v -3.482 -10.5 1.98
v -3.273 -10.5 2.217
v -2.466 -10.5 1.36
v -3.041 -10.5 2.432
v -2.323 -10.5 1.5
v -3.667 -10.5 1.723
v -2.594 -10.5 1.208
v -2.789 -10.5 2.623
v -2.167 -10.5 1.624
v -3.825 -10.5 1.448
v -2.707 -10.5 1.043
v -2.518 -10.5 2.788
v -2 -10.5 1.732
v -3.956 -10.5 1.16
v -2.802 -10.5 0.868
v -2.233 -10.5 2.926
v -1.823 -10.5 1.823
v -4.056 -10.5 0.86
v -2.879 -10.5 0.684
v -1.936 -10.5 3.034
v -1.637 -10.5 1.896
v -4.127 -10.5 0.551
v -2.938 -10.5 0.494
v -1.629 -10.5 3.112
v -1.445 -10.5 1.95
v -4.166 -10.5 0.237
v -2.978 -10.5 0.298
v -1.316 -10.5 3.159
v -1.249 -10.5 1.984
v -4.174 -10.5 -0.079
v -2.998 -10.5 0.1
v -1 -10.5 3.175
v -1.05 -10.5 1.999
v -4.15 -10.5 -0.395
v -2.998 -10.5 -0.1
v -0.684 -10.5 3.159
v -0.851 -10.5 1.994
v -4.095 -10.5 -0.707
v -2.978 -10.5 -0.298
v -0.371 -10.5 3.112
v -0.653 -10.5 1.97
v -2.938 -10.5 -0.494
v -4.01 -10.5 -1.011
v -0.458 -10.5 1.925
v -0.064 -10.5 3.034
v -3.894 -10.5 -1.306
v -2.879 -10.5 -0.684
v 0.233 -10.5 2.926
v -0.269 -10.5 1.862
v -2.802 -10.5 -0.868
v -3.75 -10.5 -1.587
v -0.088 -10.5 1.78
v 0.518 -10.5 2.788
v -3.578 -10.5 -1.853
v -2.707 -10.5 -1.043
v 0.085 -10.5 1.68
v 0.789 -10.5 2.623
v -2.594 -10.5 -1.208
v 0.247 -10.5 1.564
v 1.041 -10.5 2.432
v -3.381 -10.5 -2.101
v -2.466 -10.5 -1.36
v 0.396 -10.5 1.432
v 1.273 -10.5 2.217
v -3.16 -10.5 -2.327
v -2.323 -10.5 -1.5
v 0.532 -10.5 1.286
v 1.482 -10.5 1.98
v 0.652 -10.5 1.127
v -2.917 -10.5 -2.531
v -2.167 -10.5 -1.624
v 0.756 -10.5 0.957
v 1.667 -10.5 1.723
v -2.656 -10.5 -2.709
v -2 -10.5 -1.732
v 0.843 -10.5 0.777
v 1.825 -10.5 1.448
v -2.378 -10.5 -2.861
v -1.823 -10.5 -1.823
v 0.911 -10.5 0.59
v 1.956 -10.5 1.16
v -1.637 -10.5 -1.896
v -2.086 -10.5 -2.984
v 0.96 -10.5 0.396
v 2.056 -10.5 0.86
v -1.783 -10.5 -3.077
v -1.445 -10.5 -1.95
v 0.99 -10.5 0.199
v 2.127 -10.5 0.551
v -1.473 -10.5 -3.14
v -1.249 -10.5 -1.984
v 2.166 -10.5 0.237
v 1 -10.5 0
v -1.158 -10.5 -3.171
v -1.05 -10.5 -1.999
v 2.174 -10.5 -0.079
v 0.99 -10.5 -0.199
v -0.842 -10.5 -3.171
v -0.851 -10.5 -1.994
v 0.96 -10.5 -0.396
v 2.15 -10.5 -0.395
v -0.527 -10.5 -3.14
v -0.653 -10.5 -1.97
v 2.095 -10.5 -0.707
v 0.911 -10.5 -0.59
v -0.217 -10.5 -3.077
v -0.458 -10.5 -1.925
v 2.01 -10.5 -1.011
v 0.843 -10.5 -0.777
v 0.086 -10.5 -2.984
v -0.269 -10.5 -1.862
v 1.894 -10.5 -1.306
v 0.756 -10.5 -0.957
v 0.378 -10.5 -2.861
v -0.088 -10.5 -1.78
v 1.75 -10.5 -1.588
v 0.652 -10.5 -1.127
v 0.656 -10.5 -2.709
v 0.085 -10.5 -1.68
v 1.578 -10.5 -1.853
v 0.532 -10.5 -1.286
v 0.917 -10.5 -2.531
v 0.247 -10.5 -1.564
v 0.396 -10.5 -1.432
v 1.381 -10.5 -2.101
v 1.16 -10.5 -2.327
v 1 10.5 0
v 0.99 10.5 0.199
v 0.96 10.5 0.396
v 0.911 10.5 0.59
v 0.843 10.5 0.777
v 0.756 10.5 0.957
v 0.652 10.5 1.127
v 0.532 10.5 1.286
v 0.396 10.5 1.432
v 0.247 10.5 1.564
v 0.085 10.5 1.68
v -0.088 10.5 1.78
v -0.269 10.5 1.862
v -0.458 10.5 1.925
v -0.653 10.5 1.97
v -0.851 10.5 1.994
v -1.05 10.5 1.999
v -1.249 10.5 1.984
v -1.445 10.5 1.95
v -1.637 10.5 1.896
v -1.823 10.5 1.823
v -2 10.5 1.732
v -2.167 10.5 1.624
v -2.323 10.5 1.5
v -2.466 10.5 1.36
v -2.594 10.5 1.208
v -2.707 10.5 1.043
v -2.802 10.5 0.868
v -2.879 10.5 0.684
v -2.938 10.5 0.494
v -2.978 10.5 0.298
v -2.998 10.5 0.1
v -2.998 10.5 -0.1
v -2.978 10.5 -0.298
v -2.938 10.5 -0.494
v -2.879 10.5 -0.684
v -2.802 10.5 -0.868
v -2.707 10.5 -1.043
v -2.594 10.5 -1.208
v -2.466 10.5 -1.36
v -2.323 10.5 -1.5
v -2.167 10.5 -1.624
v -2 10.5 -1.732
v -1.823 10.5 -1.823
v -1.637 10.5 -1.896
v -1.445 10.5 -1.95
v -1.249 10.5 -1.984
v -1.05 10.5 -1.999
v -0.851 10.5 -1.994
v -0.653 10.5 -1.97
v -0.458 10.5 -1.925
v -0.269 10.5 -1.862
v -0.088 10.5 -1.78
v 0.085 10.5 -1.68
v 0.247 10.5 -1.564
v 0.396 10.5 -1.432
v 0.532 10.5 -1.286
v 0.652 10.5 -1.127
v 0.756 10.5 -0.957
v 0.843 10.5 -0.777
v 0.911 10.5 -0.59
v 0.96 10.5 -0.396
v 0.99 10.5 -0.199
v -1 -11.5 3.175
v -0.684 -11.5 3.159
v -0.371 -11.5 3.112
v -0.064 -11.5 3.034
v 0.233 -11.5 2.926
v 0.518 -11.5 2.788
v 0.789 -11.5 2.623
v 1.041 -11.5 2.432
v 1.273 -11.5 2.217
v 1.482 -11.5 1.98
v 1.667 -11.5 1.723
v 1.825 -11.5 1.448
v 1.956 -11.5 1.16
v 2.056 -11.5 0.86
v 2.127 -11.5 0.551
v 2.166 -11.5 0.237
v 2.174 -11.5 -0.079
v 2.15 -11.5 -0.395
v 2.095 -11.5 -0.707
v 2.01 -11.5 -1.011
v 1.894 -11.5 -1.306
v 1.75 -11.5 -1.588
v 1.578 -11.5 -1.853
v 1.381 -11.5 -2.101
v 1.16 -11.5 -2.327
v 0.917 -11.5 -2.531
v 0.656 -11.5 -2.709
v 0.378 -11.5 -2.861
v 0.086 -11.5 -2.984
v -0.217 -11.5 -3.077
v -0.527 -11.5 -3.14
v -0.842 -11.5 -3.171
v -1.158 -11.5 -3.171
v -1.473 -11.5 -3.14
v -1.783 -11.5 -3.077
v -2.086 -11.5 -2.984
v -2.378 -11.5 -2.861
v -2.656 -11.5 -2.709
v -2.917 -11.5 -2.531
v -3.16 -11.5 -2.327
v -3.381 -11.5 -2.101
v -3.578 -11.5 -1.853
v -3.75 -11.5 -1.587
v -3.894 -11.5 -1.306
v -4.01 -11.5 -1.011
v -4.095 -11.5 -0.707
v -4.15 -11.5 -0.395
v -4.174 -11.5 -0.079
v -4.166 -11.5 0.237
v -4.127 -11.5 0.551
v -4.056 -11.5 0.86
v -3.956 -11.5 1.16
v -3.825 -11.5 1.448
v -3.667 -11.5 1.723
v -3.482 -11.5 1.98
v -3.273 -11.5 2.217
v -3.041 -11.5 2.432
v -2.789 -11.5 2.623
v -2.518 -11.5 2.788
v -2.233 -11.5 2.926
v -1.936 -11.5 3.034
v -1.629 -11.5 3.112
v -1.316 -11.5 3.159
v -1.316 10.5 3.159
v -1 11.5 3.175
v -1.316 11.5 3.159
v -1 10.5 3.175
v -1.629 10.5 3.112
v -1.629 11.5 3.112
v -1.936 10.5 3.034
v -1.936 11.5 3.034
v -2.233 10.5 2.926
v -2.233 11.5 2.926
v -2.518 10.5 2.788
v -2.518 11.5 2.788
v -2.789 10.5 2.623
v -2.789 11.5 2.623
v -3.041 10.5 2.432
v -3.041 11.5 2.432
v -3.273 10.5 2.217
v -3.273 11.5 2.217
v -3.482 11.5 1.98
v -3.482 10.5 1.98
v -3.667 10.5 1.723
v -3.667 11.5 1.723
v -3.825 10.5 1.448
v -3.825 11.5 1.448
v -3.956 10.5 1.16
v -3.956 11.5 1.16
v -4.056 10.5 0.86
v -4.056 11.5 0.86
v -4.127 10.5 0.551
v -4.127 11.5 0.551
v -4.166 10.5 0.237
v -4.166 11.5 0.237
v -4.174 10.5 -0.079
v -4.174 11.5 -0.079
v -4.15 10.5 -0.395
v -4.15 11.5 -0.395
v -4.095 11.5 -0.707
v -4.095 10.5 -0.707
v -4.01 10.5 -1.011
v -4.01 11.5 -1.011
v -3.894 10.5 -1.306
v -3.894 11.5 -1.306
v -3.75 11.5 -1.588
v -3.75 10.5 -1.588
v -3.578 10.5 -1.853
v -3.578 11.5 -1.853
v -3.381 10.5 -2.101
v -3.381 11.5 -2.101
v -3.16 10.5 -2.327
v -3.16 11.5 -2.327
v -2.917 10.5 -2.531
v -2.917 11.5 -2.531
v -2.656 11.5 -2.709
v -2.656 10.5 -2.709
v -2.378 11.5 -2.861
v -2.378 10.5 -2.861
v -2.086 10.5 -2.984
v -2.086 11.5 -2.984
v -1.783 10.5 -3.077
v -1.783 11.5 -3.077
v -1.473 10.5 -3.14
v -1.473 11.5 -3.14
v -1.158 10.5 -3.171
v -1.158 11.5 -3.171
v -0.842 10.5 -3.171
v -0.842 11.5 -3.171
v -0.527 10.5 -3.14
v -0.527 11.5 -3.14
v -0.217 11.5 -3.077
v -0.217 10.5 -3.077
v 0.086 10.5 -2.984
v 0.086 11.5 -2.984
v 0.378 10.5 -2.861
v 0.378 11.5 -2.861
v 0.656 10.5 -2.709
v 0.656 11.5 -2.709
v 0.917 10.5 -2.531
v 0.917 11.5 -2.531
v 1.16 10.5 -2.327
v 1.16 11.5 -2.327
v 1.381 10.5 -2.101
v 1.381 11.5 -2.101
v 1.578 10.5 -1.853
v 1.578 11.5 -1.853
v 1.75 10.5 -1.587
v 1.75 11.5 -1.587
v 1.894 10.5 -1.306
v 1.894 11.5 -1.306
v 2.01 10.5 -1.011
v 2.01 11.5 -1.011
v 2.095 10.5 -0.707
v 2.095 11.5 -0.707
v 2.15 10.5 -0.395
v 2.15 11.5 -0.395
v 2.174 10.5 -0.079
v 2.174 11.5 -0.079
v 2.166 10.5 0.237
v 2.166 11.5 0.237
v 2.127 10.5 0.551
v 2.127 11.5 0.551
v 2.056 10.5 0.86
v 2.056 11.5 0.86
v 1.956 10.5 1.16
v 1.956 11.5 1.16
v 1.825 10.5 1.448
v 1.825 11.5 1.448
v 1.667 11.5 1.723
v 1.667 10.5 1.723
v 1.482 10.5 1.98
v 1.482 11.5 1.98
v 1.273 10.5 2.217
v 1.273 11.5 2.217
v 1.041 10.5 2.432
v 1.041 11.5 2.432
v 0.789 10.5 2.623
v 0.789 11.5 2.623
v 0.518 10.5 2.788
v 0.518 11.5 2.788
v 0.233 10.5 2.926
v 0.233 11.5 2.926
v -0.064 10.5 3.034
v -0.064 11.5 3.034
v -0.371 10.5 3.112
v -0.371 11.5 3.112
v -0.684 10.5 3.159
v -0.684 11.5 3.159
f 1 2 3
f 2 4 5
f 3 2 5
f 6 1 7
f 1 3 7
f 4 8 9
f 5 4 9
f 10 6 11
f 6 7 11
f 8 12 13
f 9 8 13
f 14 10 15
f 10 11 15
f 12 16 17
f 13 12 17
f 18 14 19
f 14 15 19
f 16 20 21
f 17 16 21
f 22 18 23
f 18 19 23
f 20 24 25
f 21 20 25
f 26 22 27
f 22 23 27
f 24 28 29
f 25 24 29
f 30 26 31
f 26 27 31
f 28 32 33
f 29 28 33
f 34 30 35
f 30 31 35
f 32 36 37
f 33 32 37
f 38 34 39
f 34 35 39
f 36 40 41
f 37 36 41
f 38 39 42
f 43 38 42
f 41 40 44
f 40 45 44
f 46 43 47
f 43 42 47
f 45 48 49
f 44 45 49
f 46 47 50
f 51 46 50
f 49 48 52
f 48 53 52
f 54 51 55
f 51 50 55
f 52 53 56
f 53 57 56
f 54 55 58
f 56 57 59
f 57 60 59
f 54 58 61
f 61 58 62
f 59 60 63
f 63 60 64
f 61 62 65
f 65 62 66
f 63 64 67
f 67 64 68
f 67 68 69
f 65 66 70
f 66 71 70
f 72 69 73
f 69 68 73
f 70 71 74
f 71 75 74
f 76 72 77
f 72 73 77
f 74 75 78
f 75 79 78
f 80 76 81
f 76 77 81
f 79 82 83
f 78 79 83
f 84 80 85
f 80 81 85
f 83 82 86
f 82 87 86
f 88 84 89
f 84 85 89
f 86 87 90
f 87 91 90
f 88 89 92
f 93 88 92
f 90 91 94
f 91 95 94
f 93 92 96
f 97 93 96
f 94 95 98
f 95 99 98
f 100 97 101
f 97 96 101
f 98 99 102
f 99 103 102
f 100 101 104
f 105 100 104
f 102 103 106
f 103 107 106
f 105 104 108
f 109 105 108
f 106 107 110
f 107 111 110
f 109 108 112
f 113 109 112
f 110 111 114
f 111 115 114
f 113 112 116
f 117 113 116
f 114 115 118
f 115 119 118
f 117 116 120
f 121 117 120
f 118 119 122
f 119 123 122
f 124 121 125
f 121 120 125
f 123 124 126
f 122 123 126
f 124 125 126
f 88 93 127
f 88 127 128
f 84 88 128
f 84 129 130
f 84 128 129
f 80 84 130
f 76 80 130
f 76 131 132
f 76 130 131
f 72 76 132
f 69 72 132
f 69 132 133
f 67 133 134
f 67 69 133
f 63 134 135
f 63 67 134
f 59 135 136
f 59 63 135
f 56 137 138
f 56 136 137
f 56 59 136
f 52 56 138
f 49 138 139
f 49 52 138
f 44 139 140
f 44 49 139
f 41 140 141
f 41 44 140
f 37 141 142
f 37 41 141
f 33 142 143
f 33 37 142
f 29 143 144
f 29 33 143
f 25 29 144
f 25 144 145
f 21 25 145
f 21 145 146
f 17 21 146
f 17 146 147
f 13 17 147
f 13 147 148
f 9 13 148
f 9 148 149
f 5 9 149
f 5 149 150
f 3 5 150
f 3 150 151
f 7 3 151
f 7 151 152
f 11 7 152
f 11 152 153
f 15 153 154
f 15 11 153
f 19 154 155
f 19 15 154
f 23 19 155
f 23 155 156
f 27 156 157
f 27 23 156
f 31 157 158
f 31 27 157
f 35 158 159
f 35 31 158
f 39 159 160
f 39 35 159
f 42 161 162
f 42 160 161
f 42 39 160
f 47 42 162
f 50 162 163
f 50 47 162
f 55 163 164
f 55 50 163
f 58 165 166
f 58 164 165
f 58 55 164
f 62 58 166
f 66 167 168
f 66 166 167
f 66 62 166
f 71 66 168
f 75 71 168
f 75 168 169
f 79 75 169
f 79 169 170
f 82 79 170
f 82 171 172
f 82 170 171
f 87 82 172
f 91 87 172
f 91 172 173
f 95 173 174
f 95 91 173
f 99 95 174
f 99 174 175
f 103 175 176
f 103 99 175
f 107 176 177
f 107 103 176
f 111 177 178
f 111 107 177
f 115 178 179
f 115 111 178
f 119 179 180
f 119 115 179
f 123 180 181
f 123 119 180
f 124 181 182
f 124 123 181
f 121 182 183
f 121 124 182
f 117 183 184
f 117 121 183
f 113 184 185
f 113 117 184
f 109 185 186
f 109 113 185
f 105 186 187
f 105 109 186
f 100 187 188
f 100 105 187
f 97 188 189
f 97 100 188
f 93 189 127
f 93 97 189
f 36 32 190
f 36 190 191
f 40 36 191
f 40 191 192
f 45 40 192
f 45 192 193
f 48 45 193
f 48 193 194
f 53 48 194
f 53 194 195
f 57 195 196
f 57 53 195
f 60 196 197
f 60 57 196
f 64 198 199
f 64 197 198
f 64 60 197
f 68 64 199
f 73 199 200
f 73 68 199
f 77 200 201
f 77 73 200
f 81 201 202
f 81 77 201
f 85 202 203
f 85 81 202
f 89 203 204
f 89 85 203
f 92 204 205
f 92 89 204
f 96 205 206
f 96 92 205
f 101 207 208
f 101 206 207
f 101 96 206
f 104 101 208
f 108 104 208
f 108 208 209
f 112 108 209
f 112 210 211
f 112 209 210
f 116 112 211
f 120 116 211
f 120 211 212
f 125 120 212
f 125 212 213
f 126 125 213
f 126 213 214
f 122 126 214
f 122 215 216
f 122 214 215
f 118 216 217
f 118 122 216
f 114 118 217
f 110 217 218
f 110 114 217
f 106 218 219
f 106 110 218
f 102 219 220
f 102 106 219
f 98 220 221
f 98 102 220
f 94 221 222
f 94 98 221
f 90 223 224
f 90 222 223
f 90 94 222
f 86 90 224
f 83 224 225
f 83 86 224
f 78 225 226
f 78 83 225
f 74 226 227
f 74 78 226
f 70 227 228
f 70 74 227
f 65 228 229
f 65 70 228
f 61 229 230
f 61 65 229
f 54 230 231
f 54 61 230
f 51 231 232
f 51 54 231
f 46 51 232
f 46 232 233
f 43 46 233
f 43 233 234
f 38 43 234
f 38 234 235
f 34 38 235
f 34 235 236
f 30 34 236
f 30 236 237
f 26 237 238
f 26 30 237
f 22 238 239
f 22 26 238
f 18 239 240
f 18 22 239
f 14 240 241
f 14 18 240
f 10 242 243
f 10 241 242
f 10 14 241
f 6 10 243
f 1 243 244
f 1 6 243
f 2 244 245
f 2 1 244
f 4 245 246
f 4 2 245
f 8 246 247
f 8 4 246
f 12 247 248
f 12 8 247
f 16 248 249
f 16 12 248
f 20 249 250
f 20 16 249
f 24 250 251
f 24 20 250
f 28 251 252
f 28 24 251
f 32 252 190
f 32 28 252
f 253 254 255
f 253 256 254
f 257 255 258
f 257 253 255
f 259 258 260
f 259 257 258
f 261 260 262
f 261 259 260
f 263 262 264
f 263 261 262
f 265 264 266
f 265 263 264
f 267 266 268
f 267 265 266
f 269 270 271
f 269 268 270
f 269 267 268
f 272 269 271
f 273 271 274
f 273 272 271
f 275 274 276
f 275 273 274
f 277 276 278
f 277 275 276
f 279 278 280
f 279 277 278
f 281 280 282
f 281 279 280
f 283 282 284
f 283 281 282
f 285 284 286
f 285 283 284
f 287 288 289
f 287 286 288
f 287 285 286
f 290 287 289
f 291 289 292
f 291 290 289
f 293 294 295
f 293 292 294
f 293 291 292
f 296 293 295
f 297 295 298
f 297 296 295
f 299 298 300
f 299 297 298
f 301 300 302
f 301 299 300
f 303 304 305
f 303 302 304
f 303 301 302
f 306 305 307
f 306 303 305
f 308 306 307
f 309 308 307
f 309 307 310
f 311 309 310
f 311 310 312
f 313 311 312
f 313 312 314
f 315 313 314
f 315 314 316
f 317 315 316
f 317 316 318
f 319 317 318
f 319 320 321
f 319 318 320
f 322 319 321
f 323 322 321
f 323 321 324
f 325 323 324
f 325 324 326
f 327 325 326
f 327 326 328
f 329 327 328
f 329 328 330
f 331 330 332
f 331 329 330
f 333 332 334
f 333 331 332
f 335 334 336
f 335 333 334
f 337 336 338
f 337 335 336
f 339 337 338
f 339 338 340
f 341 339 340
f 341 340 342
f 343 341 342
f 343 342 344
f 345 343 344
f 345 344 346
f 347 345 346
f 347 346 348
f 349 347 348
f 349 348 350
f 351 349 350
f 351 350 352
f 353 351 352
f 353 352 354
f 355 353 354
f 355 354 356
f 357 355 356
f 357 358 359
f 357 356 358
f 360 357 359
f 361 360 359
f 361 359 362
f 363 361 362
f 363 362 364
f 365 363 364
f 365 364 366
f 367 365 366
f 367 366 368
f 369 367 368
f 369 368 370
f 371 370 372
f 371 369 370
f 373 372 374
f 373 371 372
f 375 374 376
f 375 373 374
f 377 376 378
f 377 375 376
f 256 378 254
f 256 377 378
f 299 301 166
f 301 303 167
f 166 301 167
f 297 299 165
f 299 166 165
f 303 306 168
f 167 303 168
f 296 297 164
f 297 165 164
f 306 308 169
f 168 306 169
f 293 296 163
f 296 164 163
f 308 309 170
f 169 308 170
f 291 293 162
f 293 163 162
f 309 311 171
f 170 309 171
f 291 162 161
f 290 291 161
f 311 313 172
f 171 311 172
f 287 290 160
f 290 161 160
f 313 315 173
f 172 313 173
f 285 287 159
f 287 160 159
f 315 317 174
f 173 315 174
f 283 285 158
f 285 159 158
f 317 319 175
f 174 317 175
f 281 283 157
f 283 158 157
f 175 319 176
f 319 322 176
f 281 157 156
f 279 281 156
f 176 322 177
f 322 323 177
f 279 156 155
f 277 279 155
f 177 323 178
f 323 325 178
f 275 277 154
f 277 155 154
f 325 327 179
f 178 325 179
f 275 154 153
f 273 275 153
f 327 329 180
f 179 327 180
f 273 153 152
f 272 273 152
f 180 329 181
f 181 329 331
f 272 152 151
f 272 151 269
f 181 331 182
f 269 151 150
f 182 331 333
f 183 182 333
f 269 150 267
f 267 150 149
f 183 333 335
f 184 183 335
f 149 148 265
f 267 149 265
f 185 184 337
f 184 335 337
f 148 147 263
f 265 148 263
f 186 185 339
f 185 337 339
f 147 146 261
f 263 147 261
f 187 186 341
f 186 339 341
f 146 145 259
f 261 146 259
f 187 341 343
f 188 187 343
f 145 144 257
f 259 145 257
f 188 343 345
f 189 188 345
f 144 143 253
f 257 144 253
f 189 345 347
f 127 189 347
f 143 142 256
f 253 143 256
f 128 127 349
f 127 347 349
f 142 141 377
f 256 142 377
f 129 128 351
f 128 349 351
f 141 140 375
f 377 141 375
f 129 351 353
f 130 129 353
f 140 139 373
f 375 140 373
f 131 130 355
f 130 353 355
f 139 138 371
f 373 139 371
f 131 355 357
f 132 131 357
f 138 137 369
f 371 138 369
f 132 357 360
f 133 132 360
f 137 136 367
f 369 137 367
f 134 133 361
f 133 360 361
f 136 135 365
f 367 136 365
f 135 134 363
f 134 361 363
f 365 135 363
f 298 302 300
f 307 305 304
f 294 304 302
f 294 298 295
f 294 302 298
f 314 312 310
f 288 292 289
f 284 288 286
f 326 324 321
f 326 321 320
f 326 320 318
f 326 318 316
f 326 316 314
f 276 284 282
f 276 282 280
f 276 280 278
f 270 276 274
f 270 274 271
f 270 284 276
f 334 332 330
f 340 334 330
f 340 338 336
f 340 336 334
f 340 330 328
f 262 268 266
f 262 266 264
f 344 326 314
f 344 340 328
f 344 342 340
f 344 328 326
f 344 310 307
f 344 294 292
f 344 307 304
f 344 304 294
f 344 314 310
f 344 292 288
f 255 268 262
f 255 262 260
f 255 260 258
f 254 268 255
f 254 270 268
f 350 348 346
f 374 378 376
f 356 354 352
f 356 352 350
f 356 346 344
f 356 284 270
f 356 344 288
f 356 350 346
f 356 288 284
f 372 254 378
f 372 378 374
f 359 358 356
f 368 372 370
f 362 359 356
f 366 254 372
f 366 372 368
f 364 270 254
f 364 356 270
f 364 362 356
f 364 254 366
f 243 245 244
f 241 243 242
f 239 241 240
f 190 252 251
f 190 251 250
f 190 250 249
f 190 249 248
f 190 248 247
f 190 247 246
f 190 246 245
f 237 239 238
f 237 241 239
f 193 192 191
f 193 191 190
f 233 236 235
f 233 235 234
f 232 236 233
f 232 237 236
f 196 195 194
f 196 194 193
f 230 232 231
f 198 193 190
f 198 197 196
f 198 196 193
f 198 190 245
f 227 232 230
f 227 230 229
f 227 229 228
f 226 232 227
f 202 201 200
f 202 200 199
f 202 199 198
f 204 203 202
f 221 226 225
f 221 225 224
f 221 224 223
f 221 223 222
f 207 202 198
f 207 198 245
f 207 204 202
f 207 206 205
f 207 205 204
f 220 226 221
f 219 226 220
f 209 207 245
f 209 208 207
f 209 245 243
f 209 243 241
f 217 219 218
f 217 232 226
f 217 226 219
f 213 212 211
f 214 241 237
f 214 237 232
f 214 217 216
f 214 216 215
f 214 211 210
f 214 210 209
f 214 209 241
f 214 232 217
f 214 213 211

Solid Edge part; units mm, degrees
sketch "Sketch1" plane through (0, 0, 0) normal (0, 0, -1) x (-1, 0, 0)
  line L0 (1, -10.5) -> (1, 10.5)
  line L1 (1, 10.5) -> (-1, 10.5)
  line L2 (-1, 10.5) -> (-1, -10.5)
  line L3 (-1, -10.5) -> (1, -10.5)
revolve "RevolvedProtrusion1" add sketch "Sketch1" angle 360 about axis through (-1, -10.5, 0) along (0, 1, 0)
sketch "Sketch2" plane through (-1, 10.5, 0) normal (0, 1, 0) x (0, 0, 1)
  circle A0 centre (0, 0) radius 3.175
extrude "Protrusion1" add sketch "Sketch2" along normal blind 1
sketch "Sketch3" plane through (-1, -10.5, 0) normal (0, -1, 0) x (0, 0, 1)
  circle A0 centre (0, 0) radius 3.175
extrude "Protrusão_Extrudada_12" add sketch "Sketch3" along normal blind 1
